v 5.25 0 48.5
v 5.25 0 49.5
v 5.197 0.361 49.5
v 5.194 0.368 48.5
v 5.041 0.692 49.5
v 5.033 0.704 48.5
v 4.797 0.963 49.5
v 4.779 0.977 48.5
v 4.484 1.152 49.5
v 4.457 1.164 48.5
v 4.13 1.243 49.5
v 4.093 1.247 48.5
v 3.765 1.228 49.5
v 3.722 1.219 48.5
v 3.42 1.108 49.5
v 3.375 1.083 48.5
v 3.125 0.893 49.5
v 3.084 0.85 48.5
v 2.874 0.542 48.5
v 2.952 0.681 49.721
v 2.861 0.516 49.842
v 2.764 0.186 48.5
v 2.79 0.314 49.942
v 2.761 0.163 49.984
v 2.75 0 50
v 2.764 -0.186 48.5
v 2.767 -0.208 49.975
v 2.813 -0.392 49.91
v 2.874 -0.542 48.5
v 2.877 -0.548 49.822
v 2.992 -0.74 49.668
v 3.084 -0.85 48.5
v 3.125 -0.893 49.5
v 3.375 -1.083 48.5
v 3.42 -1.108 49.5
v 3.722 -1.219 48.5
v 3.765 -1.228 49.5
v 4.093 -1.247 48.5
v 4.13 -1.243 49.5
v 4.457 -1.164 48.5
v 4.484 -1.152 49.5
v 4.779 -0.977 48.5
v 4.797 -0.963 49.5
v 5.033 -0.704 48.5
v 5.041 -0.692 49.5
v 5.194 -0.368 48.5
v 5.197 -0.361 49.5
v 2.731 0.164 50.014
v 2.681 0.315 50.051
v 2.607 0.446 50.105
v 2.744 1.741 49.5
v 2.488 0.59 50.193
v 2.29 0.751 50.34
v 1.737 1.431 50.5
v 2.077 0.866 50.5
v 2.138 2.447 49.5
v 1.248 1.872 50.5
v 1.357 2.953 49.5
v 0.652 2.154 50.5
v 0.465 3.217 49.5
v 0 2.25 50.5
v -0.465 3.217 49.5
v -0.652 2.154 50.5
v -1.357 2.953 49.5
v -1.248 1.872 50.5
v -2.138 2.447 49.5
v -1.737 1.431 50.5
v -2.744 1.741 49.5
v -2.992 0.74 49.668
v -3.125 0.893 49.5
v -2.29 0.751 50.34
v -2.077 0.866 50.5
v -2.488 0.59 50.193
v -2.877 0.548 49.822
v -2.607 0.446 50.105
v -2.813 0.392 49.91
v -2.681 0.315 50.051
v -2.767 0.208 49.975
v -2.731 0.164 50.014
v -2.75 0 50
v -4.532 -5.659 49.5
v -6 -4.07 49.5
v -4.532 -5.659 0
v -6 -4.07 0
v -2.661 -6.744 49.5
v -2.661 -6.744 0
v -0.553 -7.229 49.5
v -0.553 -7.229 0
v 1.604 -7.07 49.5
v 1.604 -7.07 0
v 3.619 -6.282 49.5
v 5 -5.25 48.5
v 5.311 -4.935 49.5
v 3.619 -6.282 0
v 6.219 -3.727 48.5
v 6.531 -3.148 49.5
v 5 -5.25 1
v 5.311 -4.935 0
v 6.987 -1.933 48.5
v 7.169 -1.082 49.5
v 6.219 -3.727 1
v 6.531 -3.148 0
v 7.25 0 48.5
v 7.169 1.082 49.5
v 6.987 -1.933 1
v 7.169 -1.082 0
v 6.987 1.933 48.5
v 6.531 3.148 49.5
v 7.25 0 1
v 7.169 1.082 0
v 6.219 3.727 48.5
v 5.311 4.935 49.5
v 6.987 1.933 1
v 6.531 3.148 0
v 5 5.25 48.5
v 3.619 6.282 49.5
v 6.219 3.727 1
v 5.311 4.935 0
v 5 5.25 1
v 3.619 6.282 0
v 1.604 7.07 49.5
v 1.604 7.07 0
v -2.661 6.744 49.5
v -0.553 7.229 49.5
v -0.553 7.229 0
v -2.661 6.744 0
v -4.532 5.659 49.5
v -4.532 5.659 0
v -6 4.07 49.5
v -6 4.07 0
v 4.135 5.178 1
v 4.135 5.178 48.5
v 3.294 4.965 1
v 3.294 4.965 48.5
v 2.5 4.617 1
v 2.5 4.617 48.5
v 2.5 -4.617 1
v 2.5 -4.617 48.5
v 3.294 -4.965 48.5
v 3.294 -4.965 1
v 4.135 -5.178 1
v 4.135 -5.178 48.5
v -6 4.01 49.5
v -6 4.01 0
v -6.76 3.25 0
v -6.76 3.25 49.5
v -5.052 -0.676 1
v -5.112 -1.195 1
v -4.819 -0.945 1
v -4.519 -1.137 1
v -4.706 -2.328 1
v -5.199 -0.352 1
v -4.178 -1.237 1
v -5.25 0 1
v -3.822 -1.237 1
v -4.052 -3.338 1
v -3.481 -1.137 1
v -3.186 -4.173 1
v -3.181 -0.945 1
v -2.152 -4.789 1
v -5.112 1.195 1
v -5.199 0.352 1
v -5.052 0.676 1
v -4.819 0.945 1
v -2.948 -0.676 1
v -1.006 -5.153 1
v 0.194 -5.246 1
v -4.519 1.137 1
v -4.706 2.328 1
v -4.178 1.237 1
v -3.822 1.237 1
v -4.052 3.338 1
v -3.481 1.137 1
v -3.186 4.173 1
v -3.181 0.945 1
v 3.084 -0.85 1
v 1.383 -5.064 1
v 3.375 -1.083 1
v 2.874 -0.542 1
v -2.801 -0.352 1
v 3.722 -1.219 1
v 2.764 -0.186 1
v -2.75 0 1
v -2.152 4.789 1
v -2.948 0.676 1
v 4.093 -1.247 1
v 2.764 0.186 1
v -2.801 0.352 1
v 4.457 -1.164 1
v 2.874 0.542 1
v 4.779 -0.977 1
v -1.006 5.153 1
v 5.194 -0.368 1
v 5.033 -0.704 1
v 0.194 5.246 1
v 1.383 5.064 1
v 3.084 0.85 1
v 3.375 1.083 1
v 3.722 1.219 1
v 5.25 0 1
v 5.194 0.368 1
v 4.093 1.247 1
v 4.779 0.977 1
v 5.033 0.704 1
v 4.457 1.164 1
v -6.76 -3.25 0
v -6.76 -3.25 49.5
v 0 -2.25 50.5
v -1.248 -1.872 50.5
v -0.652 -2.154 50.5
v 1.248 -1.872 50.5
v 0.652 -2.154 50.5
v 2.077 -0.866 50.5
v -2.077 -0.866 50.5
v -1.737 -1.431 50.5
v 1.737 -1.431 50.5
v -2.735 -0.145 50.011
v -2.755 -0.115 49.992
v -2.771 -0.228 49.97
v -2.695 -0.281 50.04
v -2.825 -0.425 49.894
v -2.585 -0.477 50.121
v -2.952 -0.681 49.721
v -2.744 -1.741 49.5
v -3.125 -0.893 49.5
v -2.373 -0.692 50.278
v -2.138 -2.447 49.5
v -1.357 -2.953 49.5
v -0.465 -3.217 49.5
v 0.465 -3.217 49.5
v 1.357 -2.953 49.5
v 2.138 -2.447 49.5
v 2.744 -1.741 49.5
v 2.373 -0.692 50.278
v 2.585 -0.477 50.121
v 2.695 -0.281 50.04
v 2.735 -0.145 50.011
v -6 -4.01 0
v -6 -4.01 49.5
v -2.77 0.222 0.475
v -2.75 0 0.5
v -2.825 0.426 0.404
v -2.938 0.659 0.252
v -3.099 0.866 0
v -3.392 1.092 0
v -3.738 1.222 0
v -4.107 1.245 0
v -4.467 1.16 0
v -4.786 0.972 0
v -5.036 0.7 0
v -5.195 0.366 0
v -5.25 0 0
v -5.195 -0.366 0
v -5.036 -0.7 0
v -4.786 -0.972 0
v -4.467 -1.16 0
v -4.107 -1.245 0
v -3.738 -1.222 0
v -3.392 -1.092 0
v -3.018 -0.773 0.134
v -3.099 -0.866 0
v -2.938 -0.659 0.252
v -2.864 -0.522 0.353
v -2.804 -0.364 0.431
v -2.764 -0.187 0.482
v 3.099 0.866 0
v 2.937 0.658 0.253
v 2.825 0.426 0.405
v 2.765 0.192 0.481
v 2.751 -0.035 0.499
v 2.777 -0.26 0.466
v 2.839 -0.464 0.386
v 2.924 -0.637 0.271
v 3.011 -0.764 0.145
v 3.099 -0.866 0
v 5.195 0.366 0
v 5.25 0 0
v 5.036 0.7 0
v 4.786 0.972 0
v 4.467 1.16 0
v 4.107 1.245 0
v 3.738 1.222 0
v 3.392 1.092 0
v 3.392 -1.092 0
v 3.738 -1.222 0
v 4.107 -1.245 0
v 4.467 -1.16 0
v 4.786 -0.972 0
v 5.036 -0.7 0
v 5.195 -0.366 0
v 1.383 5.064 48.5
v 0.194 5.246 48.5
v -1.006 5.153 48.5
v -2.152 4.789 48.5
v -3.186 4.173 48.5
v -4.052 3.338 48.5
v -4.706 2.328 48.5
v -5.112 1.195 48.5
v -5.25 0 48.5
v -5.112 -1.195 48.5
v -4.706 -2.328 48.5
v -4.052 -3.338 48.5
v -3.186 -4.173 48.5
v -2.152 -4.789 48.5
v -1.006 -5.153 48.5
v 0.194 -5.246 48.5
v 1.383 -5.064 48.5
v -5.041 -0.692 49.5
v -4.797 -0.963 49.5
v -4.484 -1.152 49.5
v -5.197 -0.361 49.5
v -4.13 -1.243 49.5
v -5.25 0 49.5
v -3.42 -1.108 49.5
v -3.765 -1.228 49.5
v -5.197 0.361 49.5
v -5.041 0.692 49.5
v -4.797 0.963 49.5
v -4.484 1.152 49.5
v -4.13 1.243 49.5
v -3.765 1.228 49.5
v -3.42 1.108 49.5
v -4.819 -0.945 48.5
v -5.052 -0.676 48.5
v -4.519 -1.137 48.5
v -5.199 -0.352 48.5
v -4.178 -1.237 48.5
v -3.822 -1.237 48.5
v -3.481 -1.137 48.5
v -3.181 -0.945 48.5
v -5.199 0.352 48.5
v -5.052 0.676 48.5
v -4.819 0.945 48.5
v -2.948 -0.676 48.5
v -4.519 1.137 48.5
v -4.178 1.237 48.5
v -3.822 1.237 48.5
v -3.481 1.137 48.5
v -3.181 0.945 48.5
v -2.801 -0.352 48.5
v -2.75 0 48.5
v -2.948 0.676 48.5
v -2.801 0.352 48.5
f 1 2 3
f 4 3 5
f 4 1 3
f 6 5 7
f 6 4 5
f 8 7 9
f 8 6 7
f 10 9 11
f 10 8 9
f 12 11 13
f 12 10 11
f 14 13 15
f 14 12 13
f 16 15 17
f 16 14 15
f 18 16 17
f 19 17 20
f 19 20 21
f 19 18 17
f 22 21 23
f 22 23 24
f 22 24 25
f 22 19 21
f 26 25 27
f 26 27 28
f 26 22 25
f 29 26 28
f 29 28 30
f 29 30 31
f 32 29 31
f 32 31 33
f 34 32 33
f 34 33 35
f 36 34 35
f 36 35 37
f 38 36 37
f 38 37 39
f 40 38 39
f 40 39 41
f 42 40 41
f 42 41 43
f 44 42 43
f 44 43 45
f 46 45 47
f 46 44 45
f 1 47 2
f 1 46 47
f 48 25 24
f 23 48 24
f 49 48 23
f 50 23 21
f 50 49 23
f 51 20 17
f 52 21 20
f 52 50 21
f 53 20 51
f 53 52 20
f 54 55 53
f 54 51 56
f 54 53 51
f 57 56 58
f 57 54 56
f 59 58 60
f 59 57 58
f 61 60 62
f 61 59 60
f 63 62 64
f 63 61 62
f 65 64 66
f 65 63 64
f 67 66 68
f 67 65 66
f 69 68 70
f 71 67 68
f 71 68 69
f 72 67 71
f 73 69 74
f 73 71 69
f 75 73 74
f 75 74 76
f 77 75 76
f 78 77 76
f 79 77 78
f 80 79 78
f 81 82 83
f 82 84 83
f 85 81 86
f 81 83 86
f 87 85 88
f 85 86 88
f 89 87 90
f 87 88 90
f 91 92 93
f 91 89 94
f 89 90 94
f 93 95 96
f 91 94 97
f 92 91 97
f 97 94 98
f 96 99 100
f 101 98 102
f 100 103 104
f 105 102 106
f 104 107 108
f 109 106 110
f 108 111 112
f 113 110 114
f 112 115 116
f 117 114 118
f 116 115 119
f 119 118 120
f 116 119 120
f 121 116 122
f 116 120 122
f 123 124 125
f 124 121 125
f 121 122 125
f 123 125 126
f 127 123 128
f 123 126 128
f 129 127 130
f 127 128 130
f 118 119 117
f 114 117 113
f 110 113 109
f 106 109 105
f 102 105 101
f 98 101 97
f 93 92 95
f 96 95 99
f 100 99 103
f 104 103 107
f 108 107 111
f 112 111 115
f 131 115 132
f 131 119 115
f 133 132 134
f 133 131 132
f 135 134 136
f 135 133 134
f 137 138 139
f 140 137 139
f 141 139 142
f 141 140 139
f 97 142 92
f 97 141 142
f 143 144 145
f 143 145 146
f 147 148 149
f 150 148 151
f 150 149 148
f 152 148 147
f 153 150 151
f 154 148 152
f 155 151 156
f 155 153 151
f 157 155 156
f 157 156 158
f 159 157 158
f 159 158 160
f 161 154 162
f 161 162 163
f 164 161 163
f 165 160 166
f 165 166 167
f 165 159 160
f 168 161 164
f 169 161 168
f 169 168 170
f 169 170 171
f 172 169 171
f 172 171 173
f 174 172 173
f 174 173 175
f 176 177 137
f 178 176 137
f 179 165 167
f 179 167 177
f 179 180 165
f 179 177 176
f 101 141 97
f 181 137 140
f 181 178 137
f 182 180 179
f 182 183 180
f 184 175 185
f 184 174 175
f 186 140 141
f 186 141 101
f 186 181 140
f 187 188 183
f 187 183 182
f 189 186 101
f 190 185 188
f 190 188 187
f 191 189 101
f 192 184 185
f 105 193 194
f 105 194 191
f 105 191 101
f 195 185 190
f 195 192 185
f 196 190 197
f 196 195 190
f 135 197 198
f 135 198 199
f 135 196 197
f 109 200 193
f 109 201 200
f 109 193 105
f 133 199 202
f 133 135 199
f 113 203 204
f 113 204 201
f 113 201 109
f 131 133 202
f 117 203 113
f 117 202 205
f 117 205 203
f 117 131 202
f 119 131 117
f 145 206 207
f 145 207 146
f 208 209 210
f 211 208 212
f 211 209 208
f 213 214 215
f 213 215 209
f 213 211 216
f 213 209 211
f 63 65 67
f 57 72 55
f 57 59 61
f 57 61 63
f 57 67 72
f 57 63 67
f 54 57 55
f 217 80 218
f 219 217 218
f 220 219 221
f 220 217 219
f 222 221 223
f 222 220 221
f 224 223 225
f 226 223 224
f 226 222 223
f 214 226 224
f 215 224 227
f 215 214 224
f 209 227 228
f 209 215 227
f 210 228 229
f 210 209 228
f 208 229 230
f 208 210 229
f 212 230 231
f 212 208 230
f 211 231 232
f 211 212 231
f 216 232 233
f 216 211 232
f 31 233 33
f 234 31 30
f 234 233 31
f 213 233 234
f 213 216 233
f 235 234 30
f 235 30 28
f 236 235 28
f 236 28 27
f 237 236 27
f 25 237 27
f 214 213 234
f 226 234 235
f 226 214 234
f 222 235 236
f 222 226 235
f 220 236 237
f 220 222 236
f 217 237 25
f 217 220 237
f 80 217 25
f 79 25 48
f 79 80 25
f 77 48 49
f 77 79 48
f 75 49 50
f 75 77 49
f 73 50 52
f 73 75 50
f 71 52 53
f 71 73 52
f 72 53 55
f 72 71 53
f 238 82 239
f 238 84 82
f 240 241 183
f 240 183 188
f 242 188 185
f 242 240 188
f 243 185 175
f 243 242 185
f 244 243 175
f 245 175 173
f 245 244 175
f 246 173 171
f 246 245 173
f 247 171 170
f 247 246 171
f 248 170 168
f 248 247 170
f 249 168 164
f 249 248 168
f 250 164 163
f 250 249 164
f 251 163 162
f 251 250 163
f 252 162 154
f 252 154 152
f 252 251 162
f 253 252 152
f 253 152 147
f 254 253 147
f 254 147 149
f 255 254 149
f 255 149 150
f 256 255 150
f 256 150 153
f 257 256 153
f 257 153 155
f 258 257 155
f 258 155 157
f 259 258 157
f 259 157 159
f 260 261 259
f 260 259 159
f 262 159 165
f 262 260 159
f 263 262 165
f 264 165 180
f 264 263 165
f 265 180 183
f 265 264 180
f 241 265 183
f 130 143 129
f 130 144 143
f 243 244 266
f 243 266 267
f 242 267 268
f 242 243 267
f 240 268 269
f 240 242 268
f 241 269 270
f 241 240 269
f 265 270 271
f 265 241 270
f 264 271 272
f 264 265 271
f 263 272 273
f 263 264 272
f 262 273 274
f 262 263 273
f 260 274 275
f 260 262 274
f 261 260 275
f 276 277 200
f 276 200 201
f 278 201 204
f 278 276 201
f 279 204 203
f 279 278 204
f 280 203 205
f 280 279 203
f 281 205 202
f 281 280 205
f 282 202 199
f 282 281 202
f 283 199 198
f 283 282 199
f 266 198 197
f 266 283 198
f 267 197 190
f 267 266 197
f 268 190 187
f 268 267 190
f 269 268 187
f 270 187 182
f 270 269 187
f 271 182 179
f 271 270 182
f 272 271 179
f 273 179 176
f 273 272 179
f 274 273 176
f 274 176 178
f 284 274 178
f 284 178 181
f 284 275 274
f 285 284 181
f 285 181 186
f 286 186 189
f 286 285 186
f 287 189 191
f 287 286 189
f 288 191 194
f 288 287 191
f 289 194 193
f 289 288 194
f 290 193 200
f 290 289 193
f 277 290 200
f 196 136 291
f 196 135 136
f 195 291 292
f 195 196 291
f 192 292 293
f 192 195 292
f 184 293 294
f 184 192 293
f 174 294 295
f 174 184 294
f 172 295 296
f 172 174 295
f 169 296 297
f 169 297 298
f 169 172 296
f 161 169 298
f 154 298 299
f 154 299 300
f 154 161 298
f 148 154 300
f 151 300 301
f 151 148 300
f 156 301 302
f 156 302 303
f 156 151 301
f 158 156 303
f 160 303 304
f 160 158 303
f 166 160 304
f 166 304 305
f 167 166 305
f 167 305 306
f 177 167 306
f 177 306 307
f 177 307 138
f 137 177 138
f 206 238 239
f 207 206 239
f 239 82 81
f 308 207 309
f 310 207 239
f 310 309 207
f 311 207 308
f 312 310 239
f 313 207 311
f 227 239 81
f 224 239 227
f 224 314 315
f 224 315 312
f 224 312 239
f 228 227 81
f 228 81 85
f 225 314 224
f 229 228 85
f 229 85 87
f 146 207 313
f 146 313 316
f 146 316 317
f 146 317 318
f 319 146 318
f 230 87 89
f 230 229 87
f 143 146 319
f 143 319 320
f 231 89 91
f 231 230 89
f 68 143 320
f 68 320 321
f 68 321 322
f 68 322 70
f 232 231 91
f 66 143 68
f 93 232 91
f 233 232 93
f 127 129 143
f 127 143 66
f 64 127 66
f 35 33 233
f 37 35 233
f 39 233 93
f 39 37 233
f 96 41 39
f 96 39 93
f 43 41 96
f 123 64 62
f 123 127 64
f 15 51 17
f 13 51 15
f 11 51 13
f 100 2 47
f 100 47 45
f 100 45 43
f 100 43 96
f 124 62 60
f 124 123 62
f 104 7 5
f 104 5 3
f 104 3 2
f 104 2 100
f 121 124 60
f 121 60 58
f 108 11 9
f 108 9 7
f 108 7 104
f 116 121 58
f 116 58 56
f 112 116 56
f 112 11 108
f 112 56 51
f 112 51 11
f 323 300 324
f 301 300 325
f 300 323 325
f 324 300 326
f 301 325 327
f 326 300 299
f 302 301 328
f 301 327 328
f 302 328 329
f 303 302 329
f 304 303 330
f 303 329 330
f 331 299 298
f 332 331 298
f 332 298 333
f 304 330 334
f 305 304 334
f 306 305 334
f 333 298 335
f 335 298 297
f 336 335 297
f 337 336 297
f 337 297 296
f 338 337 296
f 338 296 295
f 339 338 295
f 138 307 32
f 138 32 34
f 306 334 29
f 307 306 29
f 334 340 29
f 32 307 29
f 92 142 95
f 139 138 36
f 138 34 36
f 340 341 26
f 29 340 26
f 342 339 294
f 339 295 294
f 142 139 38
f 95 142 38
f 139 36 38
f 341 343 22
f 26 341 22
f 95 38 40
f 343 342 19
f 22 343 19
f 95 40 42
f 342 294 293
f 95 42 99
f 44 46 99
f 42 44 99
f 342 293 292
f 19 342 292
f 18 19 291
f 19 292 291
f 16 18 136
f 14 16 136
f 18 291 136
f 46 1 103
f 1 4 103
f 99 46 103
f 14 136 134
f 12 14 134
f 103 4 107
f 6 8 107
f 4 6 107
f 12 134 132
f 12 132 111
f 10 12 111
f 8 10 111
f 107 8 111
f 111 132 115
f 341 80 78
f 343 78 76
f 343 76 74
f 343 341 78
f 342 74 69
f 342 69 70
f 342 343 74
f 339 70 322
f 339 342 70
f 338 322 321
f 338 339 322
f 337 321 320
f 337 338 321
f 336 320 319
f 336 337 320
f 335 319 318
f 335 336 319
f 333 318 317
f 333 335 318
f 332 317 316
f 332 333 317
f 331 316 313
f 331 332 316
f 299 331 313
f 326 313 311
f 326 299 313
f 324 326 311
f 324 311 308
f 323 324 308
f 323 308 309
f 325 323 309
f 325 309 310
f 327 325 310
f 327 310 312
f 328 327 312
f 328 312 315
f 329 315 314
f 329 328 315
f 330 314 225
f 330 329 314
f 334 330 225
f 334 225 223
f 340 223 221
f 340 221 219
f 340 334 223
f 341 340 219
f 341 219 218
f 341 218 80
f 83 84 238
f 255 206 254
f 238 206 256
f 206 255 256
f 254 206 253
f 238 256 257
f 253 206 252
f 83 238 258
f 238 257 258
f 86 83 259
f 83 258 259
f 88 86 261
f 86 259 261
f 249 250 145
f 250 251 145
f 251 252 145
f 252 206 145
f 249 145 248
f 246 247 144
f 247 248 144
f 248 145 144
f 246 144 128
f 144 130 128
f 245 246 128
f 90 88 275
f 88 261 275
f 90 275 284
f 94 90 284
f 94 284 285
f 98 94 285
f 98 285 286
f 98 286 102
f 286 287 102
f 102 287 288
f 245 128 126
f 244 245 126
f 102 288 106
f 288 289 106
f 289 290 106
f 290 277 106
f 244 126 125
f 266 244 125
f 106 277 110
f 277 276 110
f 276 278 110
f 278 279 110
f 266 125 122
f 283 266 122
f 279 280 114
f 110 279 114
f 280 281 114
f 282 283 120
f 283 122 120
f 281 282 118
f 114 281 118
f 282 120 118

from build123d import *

# Parameters (mm, degrees)
BOX001_W          = 1.51
BOX001_H          = 9.5
BOX001_DEPTH      = 49.5
CHAMFER001_SIZE   = 1.5
BOX_W             = 5
BOX_H             = 20
BOX_DEPTH         = 60
CYLINDER005_R     = 1.25
CYLINDER005_DEPTH = 55
CYLINDER004_R     = 1.25
CYLINDER004_DEPTH = 55
CYLINDER007_R     = 1
CYLINDER007_DEPTH = 8
CYLINDER006_R     = 1
CYLINDER006_DEPTH = 8
CYLINDER002_R     = 5.25
CYLINDER002_DEPTH = 47.5
CYLINDER003_R     = 5.25
CYLINDER003_DEPTH = 47.5
CYLINDER001_R     = 3.25
CYLINDER001_DEPTH = 50.5
CHAMFER_SIZE      = 1
CYLINDER_R        = 7.25
CYLINDER_DEPTH    = 49.5


with BuildPart() as chamfer001:
    # Box001 → Box001 (new body)
    with BuildSketch(Plane(origin=(-6.76, -4.75, 0), x_dir=(1, 0, 0), z_dir=(0, 0, 1))):
        with Locations((0.755, 4.75)):
            Rectangle(BOX001_W, BOX001_H)
    extrude(amount=BOX001_DEPTH)

    # Chamfer001
    chamfer001_edges = [chamfer001.edges().sort_by_distance(p)[0] for p in [
        (-6.76, -4.75, 24.75),
        (-6.76, 4.75, 24.75),
    ]]
    chamfer(chamfer001_edges, length=CHAMFER001_SIZE)


with BuildPart() as cube:
    # Box → Box (new body)
    with BuildSketch(Plane(origin=(-11, -10, -4), x_dir=(1, 0, 0), z_dir=(0, 0, 1))):
        with Locations((2.5, 10)):
            Rectangle(BOX_W, BOX_H)
    extrude(amount=BOX_DEPTH)


with BuildPart() as cylinder005:
    # Cylinder005 → Cylinder005 (new body)
    with BuildSketch(Plane(origin=(-4, 0, 0), x_dir=(1, 0, 0), z_dir=(0, 0, 1))):
        Circle(CYLINDER005_R)
    extrude(amount=CYLINDER005_DEPTH)


with BuildPart() as cylinder004:
    # Cylinder004 → Cylinder004 (new body)
    with BuildSketch(Plane(origin=(4, 0, 0), x_dir=(1, 0, 0), z_dir=(0, 0, 1))):
        Circle(CYLINDER004_R)
    extrude(amount=CYLINDER004_DEPTH)


with BuildPart() as cylinder007:
    # Cylinder007 → Cylinder007 (new body)
    with BuildSketch(Plane(origin=(-4, 0, -0.5), x_dir=(0, 0, -1), z_dir=(1, 0, 0))):
        Circle(CYLINDER007_R)
    extrude(amount=CYLINDER007_DEPTH)


with BuildPart() as fusion002:
    # Cylinder006 → Cylinder006 (new body)
    with BuildSketch(Plane(origin=(-4, 0, 51), x_dir=(0, 0, -1), z_dir=(1, 0, 0))):
        Circle(CYLINDER006_R)
    extrude(amount=CYLINDER006_DEPTH)

    # Fusion002: union Cylinder005, Cylinder004, Cylinder007
    add(cylinder005.part)
    add(cylinder004.part)
    add(cylinder007.part)


with BuildPart() as cylinder002:
    # Cylinder002 → Cylinder002 (new body)
    with BuildSketch(Plane.XY.offset(1)):
        Circle(CYLINDER002_R)
    extrude(amount=CYLINDER002_DEPTH)


with BuildPart() as fusion001:
    # Cylinder003 → Cylinder003 (new body)
    with BuildSketch(Plane(origin=(5, 0, 1), x_dir=(1, 0, 0), z_dir=(0, 0, 1))):
        Circle(CYLINDER003_R)
    extrude(amount=CYLINDER003_DEPTH)

    # Fusion001: union Cylinder002
    add(cylinder002.part)


with BuildPart() as chamfer_body:
    # Cylinder001 → Cylinder001 (new body)
    with BuildSketch(Plane.XY):
        Circle(CYLINDER001_R)
    extrude(amount=CYLINDER001_DEPTH)

    # Chamfer
    chamfer_edges = [chamfer_body.edges().sort_by_distance(p)[0] for p in [
        (-3.25, 0, 50.5),
        (-3.25, 0, 0),
    ]]
    chamfer(chamfer_edges, length=CHAMFER_SIZE)


with BuildPart() as fusion003:
    # Cylinder → Cylinder (new body)
    with BuildSketch(Plane.XY):
        Circle(CYLINDER_R)
    extrude(amount=CYLINDER_DEPTH)

    # Fusion: union Chamfer body
    add(chamfer_body.part)

    # Cut: cut Fusion001
    add(fusion001.part, mode=Mode.SUBTRACT)

    # Cut001: cut Fusion002
    add(fusion002.part, mode=Mode.SUBTRACT)

    # Cut002: cut Cube
    add(cube.part, mode=Mode.SUBTRACT)

    # Fusion003: union Chamfer001
    add(chamfer001.part)


solid = fusion003.part
